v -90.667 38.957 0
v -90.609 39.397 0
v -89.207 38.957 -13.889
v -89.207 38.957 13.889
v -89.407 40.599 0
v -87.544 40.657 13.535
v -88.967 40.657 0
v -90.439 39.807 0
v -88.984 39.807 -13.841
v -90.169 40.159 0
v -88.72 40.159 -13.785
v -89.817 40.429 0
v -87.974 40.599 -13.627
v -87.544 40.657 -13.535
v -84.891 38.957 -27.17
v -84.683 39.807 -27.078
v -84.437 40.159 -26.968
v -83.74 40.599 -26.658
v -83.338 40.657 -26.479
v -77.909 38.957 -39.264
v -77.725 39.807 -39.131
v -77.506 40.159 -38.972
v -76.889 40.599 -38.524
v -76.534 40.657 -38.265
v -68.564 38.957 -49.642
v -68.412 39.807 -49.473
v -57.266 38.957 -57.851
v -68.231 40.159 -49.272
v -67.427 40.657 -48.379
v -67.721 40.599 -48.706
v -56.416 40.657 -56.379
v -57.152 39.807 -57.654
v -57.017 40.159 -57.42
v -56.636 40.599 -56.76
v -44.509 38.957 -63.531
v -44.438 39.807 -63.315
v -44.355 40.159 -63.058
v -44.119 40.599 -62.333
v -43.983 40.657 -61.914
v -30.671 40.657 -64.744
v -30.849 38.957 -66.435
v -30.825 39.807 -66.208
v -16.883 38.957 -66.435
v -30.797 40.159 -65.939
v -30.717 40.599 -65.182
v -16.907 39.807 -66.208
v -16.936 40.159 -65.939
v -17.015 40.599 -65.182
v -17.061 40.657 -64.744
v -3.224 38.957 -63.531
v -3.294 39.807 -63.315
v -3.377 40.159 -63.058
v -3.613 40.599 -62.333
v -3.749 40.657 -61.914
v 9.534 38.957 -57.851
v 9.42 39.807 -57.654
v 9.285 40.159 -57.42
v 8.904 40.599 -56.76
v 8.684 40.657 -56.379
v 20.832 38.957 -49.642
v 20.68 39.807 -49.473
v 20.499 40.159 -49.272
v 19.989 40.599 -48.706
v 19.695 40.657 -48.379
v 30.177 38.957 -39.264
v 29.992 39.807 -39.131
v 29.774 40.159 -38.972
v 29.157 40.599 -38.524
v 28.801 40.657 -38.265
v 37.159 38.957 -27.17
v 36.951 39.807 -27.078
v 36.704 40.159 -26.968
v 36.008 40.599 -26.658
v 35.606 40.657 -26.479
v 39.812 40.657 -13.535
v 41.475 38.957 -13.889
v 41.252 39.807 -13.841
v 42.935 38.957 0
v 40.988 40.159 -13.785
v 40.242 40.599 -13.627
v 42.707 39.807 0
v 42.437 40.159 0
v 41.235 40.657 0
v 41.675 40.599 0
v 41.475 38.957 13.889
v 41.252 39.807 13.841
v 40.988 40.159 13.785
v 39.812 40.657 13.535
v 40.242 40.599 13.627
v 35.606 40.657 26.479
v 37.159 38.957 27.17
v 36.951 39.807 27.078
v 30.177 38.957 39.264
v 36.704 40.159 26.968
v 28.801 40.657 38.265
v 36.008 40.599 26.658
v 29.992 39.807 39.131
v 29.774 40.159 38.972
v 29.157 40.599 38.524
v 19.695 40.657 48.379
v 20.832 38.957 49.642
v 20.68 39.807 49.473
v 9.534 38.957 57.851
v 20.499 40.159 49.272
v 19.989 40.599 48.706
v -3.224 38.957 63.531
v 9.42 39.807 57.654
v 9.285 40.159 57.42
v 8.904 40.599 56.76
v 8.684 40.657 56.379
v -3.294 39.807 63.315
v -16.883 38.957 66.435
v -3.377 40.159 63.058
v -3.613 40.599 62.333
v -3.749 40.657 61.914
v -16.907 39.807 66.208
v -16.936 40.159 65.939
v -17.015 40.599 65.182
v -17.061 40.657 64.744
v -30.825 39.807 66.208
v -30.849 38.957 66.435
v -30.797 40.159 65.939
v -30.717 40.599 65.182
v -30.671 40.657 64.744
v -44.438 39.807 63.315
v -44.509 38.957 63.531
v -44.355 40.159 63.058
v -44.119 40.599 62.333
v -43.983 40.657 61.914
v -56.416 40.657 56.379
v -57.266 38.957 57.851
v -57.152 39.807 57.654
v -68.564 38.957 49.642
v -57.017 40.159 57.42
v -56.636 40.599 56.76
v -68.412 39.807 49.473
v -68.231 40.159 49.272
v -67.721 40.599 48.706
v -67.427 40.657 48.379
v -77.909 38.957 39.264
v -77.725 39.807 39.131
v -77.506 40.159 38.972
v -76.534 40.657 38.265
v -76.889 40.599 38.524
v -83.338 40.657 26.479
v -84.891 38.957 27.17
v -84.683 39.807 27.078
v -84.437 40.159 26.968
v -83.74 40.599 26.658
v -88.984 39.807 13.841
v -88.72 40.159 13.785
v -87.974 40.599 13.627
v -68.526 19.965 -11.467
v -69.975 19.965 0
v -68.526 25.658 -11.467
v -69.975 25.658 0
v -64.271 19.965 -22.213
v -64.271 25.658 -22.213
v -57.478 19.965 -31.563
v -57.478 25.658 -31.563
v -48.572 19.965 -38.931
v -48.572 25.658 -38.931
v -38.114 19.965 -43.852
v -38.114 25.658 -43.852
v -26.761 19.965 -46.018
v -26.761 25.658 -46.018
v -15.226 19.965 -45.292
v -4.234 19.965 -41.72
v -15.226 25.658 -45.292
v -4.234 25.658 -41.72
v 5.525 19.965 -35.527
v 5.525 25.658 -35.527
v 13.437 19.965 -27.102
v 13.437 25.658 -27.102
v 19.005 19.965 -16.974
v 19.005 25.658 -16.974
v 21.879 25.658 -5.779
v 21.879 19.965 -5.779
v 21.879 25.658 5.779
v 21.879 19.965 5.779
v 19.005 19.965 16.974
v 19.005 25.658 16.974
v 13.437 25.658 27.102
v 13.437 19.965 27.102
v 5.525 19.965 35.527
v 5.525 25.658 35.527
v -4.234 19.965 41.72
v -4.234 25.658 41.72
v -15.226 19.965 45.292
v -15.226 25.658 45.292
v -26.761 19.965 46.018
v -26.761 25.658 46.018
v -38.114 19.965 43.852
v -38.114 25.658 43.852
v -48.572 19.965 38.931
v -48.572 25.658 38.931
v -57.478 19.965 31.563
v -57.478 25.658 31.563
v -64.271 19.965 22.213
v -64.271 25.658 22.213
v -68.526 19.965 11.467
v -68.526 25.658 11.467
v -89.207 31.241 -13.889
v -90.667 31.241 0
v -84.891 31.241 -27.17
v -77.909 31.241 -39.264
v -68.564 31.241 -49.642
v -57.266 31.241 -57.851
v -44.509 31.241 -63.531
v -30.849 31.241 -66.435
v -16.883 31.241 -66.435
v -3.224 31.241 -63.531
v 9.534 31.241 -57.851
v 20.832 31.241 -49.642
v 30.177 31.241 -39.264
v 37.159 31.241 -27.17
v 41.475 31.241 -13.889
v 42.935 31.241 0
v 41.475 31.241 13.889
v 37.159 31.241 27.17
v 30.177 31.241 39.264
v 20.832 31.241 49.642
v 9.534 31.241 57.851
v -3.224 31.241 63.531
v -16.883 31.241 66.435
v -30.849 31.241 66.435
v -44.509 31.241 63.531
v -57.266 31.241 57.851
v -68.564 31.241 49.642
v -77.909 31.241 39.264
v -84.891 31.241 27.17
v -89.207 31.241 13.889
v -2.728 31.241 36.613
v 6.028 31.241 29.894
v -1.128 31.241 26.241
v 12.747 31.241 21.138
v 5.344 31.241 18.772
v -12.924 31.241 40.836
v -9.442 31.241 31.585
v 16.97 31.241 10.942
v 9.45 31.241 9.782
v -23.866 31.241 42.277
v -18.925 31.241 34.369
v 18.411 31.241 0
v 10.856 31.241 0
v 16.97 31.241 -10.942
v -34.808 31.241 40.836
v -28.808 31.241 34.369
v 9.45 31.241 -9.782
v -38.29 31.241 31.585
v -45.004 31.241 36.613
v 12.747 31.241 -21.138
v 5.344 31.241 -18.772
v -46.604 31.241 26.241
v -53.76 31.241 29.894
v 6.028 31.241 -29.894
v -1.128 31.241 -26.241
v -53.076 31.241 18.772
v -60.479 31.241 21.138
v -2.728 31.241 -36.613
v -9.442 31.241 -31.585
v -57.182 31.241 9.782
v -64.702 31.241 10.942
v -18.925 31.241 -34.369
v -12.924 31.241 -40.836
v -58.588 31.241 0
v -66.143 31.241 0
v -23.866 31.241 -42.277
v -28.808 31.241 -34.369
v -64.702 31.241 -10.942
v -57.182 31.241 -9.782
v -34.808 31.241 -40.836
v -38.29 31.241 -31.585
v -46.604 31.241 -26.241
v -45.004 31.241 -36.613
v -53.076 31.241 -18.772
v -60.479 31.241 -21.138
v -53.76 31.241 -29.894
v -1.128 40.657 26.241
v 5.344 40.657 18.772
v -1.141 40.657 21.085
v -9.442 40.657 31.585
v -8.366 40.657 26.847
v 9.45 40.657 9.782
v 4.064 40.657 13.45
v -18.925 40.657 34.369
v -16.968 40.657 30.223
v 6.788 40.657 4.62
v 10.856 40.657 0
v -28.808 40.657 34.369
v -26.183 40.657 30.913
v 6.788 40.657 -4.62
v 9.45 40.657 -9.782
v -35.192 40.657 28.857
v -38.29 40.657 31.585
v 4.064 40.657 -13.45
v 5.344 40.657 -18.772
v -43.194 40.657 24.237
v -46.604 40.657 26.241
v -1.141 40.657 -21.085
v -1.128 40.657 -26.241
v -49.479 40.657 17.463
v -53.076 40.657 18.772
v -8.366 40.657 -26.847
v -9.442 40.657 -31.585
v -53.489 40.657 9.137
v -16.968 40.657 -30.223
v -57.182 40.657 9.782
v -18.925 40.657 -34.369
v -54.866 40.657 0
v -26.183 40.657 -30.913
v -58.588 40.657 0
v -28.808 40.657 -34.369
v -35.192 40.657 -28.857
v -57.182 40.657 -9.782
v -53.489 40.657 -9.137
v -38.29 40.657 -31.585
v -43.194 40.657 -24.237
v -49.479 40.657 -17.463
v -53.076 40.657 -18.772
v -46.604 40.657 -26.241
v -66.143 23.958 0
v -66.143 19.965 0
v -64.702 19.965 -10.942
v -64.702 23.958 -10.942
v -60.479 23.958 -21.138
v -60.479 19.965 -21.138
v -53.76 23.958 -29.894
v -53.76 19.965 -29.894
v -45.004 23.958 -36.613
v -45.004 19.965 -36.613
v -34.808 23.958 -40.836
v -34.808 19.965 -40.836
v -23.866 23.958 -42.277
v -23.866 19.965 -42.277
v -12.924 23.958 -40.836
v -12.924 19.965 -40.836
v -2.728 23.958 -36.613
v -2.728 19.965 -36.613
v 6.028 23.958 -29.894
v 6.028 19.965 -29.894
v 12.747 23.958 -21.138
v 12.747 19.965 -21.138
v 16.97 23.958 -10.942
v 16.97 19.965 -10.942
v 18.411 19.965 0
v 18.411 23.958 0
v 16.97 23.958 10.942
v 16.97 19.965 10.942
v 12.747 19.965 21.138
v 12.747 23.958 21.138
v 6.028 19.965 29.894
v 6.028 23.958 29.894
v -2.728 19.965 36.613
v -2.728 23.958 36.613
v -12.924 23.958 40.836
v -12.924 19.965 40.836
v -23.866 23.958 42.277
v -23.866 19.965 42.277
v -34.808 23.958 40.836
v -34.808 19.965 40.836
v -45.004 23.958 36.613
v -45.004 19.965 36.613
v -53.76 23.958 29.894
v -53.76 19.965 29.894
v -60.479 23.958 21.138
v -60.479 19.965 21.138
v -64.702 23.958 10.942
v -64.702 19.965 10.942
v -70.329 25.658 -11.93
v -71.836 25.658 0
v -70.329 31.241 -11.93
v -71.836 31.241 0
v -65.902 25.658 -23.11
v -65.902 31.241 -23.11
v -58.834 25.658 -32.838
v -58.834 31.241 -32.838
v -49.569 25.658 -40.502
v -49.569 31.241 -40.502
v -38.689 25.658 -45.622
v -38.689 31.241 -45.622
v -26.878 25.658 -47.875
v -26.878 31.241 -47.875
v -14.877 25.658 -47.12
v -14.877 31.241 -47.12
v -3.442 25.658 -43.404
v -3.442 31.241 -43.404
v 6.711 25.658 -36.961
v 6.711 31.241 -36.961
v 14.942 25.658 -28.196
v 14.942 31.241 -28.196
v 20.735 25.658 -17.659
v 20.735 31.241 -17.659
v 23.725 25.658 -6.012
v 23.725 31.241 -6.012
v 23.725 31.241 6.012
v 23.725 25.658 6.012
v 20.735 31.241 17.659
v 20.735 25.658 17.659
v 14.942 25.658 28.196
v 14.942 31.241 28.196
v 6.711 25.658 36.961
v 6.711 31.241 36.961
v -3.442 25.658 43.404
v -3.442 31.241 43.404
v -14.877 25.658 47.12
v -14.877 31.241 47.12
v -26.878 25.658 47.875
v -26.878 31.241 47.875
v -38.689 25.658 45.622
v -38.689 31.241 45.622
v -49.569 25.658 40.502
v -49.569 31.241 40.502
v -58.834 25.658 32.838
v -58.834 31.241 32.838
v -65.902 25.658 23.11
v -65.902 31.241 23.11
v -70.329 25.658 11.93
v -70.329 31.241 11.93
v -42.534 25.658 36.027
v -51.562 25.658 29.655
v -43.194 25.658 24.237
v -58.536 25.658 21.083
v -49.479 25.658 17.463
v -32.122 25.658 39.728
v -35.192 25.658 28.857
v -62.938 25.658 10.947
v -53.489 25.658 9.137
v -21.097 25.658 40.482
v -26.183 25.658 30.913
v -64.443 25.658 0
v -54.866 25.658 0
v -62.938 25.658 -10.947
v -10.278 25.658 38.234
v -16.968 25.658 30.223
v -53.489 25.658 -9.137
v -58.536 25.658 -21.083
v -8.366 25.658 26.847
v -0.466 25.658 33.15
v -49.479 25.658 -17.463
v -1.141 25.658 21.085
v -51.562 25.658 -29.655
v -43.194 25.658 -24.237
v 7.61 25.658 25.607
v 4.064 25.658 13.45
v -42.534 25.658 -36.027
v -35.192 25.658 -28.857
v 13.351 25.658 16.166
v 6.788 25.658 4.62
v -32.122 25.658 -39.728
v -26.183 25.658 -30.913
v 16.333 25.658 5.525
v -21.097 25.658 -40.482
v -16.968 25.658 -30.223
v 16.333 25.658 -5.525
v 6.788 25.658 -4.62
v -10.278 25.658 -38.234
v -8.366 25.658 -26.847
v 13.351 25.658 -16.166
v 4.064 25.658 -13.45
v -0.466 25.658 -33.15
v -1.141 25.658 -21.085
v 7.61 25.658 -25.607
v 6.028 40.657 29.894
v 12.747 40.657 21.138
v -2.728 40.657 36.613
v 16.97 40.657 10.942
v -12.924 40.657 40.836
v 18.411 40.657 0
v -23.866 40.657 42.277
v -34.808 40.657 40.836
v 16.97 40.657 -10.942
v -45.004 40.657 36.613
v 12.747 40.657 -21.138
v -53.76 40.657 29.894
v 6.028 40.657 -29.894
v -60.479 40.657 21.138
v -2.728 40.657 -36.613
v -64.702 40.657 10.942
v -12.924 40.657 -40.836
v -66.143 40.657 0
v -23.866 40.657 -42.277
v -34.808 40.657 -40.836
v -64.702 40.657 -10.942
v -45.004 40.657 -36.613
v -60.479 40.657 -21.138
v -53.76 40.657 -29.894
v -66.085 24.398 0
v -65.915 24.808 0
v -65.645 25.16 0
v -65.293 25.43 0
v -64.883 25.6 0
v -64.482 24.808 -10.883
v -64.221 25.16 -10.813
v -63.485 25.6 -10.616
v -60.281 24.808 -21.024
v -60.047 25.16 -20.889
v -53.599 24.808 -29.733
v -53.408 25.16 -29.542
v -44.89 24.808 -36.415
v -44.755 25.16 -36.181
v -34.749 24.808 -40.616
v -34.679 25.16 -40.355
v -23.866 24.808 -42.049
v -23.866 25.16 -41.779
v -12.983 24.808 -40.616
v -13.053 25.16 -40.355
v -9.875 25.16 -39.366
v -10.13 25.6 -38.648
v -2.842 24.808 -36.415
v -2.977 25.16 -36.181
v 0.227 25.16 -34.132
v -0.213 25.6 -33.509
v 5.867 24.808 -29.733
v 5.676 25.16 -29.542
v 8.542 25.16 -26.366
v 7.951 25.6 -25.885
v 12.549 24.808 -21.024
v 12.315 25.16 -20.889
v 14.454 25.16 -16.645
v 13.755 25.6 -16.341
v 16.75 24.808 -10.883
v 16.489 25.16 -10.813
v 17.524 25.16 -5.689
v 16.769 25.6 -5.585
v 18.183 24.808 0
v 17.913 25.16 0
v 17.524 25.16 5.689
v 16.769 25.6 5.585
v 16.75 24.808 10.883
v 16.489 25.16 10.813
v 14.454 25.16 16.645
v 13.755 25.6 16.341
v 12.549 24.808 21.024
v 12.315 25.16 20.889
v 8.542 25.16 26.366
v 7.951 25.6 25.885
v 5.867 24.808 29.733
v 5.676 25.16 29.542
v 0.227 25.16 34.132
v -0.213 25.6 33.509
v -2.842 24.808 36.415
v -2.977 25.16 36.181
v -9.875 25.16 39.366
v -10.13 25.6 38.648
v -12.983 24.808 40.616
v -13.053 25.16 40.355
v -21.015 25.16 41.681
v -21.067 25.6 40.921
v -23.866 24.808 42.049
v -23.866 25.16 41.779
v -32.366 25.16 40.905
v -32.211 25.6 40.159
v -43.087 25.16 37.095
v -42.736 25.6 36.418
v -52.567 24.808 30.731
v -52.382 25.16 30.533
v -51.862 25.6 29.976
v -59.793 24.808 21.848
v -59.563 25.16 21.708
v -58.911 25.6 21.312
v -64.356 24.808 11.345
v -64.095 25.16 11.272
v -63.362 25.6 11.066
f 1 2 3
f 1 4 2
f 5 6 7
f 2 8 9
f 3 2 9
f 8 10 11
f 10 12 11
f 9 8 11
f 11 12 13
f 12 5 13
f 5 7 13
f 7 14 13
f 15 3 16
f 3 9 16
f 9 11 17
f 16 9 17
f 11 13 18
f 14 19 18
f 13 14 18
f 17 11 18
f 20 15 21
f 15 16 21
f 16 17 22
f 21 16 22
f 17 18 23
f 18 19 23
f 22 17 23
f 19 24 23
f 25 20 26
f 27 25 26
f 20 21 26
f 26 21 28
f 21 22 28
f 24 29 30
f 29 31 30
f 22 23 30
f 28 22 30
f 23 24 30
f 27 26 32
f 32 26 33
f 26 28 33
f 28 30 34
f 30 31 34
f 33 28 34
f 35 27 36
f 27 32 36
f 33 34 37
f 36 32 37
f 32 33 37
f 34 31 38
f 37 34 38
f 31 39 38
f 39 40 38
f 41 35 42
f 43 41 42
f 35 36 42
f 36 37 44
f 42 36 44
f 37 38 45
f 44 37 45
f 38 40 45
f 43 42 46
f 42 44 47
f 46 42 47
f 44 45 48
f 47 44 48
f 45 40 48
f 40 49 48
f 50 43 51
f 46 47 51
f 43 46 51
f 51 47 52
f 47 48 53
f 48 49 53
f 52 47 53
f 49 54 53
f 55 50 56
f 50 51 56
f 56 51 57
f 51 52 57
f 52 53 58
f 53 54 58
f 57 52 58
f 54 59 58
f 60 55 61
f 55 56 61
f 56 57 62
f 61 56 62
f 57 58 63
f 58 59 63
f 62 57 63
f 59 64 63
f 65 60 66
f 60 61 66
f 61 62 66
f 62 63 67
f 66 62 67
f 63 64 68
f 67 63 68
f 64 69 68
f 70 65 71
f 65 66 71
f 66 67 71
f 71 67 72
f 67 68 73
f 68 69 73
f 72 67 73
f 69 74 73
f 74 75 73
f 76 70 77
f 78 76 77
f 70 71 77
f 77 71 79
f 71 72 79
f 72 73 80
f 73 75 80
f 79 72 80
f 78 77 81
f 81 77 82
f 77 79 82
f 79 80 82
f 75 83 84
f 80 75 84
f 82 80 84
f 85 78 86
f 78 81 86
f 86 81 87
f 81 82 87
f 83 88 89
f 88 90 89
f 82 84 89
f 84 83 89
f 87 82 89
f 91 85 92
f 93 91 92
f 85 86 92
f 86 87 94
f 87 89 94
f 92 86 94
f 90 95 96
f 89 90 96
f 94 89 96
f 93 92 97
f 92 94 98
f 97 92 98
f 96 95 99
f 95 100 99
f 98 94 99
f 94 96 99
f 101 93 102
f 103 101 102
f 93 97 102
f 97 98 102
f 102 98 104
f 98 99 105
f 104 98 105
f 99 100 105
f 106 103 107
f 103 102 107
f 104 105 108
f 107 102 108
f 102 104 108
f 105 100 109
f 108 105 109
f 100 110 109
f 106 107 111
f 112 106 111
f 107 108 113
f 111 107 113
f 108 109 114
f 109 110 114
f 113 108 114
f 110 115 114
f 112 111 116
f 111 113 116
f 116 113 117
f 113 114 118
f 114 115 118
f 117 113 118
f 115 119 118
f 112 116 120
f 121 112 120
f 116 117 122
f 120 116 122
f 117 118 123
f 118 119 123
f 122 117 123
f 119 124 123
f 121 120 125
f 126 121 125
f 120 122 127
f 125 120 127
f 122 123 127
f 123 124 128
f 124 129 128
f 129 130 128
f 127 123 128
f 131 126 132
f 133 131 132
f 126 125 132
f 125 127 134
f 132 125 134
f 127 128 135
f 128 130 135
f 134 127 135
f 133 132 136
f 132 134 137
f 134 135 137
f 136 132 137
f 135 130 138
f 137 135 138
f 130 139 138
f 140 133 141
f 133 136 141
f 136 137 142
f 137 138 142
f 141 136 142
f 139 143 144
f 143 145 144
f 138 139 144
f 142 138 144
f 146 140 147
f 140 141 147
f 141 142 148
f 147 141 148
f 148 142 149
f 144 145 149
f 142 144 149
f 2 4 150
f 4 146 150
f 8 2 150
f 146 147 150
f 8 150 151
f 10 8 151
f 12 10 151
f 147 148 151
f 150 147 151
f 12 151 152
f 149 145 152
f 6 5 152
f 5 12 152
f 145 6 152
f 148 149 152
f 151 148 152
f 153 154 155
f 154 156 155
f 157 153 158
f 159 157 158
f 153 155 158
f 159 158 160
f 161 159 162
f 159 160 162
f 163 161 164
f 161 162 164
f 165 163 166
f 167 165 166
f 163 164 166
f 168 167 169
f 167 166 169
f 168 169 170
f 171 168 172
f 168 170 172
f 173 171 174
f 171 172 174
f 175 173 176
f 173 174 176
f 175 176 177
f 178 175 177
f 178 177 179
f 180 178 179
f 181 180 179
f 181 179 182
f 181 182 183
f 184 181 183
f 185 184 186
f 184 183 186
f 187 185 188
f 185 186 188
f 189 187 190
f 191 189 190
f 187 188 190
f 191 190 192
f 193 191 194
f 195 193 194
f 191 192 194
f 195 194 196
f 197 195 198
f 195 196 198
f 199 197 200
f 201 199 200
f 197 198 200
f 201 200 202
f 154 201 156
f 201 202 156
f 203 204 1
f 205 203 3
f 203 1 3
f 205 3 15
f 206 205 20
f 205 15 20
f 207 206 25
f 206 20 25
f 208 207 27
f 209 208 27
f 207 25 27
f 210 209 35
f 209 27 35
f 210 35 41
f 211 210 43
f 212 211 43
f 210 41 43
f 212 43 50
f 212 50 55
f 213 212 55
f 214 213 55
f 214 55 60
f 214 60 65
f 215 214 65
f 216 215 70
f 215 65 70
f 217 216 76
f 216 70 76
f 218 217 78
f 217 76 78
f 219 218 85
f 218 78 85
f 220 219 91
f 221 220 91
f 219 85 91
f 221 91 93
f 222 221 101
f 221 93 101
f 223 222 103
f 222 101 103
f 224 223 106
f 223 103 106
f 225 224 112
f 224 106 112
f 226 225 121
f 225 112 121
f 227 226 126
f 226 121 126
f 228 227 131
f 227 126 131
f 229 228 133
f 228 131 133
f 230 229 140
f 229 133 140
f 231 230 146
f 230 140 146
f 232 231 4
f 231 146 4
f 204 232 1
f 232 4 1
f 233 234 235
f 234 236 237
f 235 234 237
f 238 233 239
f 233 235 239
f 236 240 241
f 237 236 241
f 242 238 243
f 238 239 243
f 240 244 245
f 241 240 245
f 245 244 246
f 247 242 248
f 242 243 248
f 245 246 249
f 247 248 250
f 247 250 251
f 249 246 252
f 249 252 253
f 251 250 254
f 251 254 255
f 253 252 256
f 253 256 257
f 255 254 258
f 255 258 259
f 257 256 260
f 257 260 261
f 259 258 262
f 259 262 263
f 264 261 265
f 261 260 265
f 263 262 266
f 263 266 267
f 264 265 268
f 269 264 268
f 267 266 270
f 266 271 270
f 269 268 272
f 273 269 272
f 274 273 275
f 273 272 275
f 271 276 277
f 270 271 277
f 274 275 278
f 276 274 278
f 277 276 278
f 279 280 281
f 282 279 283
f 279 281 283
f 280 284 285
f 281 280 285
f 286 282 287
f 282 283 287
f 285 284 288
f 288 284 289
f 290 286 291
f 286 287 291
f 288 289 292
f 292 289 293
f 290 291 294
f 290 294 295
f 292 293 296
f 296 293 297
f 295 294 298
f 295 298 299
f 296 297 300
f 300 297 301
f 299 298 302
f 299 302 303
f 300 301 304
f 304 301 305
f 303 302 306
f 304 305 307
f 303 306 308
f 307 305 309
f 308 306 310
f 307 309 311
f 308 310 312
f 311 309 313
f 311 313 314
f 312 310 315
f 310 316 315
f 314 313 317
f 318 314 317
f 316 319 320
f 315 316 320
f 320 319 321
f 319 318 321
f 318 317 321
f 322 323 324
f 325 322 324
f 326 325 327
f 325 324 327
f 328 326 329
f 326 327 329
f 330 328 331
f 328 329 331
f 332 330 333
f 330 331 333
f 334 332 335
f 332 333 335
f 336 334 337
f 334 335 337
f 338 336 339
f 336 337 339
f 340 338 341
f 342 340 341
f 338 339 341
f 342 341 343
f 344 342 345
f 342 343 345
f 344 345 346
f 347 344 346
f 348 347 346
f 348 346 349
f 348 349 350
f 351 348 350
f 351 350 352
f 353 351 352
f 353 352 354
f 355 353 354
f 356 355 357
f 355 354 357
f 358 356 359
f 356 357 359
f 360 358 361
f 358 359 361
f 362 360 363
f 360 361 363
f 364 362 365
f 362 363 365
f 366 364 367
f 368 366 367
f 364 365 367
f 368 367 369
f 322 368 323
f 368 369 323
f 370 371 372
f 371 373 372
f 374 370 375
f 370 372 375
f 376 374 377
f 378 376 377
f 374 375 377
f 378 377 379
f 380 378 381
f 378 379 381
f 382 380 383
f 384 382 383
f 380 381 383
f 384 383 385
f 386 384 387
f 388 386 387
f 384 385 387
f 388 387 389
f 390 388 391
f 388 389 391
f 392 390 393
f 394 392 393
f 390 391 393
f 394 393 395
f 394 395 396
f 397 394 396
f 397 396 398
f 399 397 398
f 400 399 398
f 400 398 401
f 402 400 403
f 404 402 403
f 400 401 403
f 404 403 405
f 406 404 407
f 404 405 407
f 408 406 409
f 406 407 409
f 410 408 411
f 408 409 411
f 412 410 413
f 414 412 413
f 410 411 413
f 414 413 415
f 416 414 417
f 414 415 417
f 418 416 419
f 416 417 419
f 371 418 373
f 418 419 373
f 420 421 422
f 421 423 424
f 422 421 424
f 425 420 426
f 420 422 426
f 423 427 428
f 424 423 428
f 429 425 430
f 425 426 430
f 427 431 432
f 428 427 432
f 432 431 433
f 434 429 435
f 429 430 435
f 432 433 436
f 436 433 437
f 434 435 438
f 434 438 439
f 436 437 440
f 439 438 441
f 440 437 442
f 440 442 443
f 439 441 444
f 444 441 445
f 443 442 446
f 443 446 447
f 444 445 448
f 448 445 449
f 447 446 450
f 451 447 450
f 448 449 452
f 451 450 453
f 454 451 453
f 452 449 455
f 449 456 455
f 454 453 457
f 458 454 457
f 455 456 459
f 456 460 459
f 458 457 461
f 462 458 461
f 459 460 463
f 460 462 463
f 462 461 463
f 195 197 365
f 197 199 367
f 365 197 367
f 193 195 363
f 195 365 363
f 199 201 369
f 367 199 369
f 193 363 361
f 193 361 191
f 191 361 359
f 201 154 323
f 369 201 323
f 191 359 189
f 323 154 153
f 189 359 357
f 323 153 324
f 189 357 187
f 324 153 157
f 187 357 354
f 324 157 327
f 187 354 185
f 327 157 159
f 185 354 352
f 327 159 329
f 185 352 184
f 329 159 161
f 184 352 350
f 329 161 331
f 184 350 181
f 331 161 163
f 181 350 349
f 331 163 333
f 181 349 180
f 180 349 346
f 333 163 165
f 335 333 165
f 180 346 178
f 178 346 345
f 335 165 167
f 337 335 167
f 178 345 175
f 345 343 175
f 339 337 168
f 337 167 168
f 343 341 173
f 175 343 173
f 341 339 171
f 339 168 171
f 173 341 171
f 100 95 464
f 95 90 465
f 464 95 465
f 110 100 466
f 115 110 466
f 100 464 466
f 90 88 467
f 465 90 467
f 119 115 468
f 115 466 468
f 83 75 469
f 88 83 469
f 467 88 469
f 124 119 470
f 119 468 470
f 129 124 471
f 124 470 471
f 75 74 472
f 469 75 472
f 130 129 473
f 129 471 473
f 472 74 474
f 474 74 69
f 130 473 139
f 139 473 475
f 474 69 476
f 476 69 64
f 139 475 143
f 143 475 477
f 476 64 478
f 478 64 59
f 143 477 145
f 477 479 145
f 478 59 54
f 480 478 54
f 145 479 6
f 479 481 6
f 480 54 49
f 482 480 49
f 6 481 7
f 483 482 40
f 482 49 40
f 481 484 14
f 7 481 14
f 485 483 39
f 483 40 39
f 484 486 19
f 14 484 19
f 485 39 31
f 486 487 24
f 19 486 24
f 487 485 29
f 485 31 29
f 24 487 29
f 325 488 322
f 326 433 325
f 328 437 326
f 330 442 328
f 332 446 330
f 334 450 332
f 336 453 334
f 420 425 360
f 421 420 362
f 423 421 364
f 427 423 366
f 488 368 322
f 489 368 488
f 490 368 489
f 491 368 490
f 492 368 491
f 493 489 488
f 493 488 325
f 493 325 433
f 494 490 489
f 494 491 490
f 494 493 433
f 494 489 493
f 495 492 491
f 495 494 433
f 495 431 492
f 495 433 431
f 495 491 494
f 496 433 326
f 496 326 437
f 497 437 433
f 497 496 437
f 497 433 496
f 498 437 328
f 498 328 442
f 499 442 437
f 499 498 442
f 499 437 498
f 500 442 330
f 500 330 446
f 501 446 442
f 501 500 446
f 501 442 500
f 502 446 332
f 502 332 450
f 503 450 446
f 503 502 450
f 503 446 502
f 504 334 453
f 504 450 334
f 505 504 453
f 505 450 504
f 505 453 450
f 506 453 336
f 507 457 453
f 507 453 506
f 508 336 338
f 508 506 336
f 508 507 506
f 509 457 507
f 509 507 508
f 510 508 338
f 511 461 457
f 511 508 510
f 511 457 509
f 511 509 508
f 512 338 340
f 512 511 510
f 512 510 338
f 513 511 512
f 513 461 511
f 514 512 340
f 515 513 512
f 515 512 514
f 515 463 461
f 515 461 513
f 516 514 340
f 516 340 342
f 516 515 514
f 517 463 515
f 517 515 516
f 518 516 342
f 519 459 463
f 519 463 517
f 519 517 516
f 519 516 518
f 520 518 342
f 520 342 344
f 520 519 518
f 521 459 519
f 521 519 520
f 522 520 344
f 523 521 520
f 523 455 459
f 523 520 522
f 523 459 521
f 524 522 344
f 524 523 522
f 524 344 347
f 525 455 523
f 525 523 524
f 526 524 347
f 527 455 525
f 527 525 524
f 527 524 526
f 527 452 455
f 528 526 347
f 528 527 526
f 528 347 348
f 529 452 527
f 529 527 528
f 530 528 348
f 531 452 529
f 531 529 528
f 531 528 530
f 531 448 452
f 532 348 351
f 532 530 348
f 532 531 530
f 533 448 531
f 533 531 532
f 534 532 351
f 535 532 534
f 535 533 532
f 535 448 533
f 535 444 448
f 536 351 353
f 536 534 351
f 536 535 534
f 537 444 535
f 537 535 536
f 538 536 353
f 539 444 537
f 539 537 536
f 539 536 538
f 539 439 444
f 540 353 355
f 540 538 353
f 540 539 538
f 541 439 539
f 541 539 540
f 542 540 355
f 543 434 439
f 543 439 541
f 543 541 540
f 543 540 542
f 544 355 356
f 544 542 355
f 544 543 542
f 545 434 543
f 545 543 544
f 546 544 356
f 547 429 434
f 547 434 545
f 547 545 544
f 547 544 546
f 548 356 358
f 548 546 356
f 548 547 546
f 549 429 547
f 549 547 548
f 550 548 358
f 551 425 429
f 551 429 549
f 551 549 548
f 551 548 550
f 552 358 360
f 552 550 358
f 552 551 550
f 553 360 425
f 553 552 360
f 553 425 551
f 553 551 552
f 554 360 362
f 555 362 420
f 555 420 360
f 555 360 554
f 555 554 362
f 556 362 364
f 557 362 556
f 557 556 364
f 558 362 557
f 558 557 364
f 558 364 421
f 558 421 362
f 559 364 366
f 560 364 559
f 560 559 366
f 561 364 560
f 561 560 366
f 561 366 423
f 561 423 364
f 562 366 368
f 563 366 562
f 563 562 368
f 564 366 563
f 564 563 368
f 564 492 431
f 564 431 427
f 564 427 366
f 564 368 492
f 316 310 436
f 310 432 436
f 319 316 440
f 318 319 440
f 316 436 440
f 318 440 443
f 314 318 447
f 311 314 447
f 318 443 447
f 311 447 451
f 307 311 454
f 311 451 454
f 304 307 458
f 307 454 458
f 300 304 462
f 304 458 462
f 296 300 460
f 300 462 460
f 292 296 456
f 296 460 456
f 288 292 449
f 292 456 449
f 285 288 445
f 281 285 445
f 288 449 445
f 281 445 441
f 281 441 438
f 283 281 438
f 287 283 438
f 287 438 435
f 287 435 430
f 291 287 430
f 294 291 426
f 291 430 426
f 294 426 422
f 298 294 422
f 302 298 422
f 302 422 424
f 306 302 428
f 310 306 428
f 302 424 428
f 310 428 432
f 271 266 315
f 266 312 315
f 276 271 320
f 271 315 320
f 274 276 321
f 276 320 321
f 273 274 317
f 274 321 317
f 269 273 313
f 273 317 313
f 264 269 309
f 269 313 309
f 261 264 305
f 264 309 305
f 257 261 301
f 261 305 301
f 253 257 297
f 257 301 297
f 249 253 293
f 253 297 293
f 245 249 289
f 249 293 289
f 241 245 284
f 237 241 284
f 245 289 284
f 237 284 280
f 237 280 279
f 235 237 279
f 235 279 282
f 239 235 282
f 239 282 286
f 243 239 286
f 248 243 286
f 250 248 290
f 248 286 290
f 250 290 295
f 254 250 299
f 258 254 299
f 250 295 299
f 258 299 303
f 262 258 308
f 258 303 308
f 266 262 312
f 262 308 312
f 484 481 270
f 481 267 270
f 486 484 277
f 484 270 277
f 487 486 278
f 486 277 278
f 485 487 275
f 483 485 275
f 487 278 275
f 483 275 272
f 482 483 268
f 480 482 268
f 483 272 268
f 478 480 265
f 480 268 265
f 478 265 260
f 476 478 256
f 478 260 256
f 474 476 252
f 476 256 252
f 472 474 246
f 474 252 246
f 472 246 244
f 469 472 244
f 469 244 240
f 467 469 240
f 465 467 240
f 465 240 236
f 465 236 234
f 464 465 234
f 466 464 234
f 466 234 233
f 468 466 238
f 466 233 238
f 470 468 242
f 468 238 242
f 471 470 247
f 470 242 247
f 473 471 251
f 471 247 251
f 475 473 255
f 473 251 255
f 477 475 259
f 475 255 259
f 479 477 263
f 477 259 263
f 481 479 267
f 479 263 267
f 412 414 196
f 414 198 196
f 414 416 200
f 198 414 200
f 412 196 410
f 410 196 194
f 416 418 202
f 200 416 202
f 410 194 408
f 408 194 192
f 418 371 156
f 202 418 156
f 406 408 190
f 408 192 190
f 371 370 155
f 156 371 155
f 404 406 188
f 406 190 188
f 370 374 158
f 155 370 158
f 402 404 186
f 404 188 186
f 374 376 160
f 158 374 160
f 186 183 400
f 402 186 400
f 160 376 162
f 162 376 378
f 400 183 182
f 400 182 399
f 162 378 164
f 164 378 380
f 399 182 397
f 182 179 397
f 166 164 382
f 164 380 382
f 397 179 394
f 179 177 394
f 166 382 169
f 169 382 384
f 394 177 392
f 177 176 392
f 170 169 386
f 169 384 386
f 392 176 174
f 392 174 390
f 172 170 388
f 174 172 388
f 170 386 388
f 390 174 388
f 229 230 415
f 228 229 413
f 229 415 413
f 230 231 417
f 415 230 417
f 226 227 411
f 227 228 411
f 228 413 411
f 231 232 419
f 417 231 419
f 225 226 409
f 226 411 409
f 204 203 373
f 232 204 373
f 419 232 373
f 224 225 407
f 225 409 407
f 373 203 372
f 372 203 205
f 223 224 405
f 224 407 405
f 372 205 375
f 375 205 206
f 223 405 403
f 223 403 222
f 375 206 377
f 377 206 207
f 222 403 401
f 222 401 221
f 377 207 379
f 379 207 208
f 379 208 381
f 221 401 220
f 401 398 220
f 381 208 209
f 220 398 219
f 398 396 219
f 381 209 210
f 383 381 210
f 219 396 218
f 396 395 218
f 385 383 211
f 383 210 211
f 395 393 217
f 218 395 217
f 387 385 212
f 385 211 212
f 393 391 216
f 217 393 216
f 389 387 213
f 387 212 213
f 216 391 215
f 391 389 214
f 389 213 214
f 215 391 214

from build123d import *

# Parameters (mm, degrees)
FILLET3_R = 1.7
FILLET4_R = 1.7


with BuildPart() as part:
    # Sketch1 → Revolve2 (revolve)
    with BuildSketch(Plane.XY):
        Polygon((-71.835738672, 25.657855278), (-71.835738672, 31.241430002), (-90.666618133, 31.241430002), (-90.666618133, 40.656869732), (-66.142682091, 40.656869732), (-66.142682091, 31.241430002), (-58.588433936, 31.241430002), (-58.588433936, 40.656869732), (-54.866050787, 40.656869732), (-54.866050787, 25.657855278), (-66.142682091, 25.657855278), (-66.142682091, 19.964798697), (-69.974547098, 19.964798697), (-69.974547098, 25.657855278), align=None)
    revolve(axis=Axis((-23.866050787, 40.656869732, 0), (0, -1, 0)))

    # Fillet3
    fillet3_edges = [part.edges().sort_by_distance(p)[0] for p in [
        (42.93451656, 40.656869732, 0),
    ]]
    fillet(fillet3_edges, radius=FILLET3_R)

    # Fillet4
    fillet4_edges = [part.edges().sort_by_distance(p)[0] for p in [
        (18.410580518, 25.657855278, 0),
    ]]
    fillet(fillet4_edges, radius=FILLET4_R)


solid = part.part
